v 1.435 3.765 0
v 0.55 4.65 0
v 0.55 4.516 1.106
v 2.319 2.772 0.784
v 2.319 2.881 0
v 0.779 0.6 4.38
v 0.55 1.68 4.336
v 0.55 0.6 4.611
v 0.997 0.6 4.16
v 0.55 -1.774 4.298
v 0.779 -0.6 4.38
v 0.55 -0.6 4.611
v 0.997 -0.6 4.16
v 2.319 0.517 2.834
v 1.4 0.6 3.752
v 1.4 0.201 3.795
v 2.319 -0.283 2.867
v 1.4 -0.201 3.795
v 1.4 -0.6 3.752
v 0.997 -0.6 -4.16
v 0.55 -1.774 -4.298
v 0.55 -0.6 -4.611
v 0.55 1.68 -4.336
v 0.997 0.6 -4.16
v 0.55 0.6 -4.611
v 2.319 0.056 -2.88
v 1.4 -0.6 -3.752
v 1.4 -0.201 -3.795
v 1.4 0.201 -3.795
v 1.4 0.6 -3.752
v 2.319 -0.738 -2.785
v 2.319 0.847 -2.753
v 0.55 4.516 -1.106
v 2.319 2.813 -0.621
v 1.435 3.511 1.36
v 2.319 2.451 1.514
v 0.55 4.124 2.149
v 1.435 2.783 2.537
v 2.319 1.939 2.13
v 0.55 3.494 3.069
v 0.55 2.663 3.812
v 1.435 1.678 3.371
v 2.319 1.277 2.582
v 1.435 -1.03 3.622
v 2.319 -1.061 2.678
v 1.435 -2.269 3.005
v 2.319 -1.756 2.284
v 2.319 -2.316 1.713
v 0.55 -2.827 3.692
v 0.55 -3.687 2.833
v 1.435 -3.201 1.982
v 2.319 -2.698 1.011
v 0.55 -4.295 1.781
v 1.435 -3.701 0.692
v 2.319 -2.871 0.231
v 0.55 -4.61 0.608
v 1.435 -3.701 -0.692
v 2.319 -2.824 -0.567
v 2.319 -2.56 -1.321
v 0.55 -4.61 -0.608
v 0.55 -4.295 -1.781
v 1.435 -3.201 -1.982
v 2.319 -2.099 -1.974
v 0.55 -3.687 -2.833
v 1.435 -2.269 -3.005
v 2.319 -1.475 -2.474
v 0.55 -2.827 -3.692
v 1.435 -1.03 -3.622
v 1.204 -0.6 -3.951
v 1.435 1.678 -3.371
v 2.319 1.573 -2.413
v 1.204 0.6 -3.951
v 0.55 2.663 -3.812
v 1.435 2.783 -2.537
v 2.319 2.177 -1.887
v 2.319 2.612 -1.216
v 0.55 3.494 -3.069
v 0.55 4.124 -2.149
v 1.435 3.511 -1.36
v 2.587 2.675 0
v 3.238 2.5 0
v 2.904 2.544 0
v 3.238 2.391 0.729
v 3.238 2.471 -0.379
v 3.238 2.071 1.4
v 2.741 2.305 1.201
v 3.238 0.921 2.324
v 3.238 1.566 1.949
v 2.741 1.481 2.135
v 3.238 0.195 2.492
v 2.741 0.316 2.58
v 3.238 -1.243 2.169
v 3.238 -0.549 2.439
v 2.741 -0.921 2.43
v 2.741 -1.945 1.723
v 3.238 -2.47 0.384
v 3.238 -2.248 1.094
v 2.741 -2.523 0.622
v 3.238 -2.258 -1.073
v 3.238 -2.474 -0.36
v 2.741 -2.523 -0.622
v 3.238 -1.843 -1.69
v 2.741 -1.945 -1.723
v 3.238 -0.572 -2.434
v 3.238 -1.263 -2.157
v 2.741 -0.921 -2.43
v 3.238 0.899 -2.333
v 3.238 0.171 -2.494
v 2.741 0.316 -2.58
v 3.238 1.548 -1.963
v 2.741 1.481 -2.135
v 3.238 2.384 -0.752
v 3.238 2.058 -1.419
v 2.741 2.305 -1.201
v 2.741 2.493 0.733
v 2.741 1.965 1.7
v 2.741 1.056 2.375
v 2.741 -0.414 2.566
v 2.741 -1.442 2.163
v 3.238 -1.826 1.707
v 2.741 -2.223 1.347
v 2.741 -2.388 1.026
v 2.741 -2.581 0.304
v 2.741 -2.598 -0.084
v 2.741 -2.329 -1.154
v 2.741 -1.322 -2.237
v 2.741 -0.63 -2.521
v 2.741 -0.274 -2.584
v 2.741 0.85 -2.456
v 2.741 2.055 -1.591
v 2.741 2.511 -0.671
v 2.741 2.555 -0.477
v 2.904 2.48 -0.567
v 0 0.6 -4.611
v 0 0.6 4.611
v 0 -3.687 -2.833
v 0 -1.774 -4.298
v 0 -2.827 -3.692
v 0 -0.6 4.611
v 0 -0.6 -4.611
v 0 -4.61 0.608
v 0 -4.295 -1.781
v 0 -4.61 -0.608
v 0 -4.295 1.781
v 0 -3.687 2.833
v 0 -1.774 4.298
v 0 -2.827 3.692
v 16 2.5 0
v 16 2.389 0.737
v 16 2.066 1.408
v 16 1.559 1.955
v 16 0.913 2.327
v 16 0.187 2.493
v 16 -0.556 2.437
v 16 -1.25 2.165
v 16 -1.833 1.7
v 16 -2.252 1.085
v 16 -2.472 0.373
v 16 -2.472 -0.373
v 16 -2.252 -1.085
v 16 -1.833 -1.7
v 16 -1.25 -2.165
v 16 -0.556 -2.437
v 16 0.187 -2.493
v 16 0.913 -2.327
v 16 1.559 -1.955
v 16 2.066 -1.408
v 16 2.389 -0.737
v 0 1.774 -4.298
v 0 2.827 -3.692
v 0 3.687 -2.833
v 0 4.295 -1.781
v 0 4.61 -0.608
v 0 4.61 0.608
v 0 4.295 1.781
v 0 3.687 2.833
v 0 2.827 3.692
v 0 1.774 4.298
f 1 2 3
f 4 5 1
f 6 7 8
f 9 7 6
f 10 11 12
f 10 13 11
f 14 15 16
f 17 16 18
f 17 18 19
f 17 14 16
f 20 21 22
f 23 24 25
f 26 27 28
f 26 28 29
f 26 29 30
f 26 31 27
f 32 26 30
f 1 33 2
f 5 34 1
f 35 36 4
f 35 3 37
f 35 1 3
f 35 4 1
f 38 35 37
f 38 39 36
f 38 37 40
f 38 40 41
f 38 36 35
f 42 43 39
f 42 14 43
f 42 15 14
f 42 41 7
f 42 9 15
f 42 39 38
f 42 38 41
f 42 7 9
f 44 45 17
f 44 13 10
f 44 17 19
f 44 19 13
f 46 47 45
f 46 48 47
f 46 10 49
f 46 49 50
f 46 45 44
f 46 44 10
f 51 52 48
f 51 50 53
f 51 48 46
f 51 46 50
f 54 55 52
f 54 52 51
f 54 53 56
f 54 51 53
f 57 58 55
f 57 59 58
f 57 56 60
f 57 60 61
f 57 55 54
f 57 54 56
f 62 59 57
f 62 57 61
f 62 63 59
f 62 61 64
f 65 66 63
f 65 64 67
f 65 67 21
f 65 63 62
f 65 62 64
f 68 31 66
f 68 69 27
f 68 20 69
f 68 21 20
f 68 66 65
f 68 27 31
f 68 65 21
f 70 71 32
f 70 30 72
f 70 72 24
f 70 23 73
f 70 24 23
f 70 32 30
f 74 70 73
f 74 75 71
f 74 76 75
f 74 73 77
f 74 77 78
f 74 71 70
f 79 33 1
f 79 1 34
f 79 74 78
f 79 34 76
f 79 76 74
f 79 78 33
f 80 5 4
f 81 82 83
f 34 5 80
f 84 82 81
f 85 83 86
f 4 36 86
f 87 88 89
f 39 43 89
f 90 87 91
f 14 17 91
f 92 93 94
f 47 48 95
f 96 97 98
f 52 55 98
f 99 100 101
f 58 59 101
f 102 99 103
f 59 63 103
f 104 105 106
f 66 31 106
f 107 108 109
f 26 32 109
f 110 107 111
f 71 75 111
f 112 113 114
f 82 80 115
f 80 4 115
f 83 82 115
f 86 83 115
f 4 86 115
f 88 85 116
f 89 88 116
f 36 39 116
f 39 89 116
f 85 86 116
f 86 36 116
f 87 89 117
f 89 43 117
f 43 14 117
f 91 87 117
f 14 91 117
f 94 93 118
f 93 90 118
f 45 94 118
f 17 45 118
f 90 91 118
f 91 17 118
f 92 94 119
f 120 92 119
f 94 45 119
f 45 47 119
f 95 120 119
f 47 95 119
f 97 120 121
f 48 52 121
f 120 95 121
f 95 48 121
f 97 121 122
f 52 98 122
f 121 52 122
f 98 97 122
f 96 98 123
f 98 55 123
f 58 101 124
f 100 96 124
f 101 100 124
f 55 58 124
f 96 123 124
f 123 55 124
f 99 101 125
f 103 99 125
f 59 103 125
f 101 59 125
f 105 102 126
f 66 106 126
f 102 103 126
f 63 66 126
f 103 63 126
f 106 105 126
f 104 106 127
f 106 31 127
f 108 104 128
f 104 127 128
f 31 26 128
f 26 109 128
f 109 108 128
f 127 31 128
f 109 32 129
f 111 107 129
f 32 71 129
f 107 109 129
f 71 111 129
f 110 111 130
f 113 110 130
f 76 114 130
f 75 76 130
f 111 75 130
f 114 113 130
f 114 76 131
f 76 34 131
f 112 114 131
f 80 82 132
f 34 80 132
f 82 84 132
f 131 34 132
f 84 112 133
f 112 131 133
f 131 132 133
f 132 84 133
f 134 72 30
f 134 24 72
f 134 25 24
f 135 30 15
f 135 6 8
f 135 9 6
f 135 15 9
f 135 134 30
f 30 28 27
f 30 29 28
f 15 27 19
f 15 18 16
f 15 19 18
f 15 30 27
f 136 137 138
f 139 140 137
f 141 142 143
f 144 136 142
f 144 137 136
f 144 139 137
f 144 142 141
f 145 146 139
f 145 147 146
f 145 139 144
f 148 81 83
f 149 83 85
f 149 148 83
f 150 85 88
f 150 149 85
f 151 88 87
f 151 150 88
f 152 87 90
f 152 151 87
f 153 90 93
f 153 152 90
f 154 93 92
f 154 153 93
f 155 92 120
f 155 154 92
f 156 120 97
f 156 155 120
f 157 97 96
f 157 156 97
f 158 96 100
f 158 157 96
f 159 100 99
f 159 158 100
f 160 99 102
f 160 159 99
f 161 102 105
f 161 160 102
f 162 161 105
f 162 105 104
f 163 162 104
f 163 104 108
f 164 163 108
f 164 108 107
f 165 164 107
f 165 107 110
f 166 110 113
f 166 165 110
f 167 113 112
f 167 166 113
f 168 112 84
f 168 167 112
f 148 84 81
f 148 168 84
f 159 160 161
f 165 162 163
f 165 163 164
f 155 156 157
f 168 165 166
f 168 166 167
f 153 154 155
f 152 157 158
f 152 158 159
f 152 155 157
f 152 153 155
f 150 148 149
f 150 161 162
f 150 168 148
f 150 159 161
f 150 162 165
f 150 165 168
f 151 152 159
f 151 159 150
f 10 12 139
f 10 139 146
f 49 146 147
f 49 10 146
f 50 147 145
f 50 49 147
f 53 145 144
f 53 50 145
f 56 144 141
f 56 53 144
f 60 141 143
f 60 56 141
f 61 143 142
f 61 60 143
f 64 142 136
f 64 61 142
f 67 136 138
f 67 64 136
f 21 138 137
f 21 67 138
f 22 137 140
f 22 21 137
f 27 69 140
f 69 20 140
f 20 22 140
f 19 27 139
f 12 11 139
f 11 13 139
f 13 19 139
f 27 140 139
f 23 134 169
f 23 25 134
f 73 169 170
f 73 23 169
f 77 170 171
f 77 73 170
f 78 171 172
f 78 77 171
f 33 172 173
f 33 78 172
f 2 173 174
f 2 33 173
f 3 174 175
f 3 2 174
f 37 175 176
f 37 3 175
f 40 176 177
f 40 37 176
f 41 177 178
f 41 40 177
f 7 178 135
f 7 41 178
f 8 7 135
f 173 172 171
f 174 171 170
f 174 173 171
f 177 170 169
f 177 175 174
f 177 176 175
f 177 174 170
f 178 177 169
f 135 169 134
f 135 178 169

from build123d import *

# Parameters (mm, degrees)
FILLET1_R  = 1.3
SKETCH2_W  = 9.3
SKETCH2_H  = 1.2
SLOT_DEPTH = 1.4


with BuildPart() as part:
    # BodySke → Base-Revolve (revolve)
    with BuildSketch(Plane.XY):
        Polygon((0, 0), (0, 4.65), (0.55, 4.65), (2.7, 2.5), (16, 2.5), (16, 0), align=None)
    revolve(axis=Axis((-6.35, 0, 0), (1, 0, 0)))

    # Fillet1
    fillet1_edges = [part.edges().sort_by_distance(p)[0] for p in [
        (2.7, -2.5, 0),
    ]]
    fillet(fillet1_edges, radius=FILLET1_R)

    # Sketch2 → Slot (cut)
    with BuildSketch(Plane.ZY):
        Rectangle(SKETCH2_W, SKETCH2_H)
    extrude(amount=-SLOT_DEPTH, mode=Mode.SUBTRACT)


solid = part.part
